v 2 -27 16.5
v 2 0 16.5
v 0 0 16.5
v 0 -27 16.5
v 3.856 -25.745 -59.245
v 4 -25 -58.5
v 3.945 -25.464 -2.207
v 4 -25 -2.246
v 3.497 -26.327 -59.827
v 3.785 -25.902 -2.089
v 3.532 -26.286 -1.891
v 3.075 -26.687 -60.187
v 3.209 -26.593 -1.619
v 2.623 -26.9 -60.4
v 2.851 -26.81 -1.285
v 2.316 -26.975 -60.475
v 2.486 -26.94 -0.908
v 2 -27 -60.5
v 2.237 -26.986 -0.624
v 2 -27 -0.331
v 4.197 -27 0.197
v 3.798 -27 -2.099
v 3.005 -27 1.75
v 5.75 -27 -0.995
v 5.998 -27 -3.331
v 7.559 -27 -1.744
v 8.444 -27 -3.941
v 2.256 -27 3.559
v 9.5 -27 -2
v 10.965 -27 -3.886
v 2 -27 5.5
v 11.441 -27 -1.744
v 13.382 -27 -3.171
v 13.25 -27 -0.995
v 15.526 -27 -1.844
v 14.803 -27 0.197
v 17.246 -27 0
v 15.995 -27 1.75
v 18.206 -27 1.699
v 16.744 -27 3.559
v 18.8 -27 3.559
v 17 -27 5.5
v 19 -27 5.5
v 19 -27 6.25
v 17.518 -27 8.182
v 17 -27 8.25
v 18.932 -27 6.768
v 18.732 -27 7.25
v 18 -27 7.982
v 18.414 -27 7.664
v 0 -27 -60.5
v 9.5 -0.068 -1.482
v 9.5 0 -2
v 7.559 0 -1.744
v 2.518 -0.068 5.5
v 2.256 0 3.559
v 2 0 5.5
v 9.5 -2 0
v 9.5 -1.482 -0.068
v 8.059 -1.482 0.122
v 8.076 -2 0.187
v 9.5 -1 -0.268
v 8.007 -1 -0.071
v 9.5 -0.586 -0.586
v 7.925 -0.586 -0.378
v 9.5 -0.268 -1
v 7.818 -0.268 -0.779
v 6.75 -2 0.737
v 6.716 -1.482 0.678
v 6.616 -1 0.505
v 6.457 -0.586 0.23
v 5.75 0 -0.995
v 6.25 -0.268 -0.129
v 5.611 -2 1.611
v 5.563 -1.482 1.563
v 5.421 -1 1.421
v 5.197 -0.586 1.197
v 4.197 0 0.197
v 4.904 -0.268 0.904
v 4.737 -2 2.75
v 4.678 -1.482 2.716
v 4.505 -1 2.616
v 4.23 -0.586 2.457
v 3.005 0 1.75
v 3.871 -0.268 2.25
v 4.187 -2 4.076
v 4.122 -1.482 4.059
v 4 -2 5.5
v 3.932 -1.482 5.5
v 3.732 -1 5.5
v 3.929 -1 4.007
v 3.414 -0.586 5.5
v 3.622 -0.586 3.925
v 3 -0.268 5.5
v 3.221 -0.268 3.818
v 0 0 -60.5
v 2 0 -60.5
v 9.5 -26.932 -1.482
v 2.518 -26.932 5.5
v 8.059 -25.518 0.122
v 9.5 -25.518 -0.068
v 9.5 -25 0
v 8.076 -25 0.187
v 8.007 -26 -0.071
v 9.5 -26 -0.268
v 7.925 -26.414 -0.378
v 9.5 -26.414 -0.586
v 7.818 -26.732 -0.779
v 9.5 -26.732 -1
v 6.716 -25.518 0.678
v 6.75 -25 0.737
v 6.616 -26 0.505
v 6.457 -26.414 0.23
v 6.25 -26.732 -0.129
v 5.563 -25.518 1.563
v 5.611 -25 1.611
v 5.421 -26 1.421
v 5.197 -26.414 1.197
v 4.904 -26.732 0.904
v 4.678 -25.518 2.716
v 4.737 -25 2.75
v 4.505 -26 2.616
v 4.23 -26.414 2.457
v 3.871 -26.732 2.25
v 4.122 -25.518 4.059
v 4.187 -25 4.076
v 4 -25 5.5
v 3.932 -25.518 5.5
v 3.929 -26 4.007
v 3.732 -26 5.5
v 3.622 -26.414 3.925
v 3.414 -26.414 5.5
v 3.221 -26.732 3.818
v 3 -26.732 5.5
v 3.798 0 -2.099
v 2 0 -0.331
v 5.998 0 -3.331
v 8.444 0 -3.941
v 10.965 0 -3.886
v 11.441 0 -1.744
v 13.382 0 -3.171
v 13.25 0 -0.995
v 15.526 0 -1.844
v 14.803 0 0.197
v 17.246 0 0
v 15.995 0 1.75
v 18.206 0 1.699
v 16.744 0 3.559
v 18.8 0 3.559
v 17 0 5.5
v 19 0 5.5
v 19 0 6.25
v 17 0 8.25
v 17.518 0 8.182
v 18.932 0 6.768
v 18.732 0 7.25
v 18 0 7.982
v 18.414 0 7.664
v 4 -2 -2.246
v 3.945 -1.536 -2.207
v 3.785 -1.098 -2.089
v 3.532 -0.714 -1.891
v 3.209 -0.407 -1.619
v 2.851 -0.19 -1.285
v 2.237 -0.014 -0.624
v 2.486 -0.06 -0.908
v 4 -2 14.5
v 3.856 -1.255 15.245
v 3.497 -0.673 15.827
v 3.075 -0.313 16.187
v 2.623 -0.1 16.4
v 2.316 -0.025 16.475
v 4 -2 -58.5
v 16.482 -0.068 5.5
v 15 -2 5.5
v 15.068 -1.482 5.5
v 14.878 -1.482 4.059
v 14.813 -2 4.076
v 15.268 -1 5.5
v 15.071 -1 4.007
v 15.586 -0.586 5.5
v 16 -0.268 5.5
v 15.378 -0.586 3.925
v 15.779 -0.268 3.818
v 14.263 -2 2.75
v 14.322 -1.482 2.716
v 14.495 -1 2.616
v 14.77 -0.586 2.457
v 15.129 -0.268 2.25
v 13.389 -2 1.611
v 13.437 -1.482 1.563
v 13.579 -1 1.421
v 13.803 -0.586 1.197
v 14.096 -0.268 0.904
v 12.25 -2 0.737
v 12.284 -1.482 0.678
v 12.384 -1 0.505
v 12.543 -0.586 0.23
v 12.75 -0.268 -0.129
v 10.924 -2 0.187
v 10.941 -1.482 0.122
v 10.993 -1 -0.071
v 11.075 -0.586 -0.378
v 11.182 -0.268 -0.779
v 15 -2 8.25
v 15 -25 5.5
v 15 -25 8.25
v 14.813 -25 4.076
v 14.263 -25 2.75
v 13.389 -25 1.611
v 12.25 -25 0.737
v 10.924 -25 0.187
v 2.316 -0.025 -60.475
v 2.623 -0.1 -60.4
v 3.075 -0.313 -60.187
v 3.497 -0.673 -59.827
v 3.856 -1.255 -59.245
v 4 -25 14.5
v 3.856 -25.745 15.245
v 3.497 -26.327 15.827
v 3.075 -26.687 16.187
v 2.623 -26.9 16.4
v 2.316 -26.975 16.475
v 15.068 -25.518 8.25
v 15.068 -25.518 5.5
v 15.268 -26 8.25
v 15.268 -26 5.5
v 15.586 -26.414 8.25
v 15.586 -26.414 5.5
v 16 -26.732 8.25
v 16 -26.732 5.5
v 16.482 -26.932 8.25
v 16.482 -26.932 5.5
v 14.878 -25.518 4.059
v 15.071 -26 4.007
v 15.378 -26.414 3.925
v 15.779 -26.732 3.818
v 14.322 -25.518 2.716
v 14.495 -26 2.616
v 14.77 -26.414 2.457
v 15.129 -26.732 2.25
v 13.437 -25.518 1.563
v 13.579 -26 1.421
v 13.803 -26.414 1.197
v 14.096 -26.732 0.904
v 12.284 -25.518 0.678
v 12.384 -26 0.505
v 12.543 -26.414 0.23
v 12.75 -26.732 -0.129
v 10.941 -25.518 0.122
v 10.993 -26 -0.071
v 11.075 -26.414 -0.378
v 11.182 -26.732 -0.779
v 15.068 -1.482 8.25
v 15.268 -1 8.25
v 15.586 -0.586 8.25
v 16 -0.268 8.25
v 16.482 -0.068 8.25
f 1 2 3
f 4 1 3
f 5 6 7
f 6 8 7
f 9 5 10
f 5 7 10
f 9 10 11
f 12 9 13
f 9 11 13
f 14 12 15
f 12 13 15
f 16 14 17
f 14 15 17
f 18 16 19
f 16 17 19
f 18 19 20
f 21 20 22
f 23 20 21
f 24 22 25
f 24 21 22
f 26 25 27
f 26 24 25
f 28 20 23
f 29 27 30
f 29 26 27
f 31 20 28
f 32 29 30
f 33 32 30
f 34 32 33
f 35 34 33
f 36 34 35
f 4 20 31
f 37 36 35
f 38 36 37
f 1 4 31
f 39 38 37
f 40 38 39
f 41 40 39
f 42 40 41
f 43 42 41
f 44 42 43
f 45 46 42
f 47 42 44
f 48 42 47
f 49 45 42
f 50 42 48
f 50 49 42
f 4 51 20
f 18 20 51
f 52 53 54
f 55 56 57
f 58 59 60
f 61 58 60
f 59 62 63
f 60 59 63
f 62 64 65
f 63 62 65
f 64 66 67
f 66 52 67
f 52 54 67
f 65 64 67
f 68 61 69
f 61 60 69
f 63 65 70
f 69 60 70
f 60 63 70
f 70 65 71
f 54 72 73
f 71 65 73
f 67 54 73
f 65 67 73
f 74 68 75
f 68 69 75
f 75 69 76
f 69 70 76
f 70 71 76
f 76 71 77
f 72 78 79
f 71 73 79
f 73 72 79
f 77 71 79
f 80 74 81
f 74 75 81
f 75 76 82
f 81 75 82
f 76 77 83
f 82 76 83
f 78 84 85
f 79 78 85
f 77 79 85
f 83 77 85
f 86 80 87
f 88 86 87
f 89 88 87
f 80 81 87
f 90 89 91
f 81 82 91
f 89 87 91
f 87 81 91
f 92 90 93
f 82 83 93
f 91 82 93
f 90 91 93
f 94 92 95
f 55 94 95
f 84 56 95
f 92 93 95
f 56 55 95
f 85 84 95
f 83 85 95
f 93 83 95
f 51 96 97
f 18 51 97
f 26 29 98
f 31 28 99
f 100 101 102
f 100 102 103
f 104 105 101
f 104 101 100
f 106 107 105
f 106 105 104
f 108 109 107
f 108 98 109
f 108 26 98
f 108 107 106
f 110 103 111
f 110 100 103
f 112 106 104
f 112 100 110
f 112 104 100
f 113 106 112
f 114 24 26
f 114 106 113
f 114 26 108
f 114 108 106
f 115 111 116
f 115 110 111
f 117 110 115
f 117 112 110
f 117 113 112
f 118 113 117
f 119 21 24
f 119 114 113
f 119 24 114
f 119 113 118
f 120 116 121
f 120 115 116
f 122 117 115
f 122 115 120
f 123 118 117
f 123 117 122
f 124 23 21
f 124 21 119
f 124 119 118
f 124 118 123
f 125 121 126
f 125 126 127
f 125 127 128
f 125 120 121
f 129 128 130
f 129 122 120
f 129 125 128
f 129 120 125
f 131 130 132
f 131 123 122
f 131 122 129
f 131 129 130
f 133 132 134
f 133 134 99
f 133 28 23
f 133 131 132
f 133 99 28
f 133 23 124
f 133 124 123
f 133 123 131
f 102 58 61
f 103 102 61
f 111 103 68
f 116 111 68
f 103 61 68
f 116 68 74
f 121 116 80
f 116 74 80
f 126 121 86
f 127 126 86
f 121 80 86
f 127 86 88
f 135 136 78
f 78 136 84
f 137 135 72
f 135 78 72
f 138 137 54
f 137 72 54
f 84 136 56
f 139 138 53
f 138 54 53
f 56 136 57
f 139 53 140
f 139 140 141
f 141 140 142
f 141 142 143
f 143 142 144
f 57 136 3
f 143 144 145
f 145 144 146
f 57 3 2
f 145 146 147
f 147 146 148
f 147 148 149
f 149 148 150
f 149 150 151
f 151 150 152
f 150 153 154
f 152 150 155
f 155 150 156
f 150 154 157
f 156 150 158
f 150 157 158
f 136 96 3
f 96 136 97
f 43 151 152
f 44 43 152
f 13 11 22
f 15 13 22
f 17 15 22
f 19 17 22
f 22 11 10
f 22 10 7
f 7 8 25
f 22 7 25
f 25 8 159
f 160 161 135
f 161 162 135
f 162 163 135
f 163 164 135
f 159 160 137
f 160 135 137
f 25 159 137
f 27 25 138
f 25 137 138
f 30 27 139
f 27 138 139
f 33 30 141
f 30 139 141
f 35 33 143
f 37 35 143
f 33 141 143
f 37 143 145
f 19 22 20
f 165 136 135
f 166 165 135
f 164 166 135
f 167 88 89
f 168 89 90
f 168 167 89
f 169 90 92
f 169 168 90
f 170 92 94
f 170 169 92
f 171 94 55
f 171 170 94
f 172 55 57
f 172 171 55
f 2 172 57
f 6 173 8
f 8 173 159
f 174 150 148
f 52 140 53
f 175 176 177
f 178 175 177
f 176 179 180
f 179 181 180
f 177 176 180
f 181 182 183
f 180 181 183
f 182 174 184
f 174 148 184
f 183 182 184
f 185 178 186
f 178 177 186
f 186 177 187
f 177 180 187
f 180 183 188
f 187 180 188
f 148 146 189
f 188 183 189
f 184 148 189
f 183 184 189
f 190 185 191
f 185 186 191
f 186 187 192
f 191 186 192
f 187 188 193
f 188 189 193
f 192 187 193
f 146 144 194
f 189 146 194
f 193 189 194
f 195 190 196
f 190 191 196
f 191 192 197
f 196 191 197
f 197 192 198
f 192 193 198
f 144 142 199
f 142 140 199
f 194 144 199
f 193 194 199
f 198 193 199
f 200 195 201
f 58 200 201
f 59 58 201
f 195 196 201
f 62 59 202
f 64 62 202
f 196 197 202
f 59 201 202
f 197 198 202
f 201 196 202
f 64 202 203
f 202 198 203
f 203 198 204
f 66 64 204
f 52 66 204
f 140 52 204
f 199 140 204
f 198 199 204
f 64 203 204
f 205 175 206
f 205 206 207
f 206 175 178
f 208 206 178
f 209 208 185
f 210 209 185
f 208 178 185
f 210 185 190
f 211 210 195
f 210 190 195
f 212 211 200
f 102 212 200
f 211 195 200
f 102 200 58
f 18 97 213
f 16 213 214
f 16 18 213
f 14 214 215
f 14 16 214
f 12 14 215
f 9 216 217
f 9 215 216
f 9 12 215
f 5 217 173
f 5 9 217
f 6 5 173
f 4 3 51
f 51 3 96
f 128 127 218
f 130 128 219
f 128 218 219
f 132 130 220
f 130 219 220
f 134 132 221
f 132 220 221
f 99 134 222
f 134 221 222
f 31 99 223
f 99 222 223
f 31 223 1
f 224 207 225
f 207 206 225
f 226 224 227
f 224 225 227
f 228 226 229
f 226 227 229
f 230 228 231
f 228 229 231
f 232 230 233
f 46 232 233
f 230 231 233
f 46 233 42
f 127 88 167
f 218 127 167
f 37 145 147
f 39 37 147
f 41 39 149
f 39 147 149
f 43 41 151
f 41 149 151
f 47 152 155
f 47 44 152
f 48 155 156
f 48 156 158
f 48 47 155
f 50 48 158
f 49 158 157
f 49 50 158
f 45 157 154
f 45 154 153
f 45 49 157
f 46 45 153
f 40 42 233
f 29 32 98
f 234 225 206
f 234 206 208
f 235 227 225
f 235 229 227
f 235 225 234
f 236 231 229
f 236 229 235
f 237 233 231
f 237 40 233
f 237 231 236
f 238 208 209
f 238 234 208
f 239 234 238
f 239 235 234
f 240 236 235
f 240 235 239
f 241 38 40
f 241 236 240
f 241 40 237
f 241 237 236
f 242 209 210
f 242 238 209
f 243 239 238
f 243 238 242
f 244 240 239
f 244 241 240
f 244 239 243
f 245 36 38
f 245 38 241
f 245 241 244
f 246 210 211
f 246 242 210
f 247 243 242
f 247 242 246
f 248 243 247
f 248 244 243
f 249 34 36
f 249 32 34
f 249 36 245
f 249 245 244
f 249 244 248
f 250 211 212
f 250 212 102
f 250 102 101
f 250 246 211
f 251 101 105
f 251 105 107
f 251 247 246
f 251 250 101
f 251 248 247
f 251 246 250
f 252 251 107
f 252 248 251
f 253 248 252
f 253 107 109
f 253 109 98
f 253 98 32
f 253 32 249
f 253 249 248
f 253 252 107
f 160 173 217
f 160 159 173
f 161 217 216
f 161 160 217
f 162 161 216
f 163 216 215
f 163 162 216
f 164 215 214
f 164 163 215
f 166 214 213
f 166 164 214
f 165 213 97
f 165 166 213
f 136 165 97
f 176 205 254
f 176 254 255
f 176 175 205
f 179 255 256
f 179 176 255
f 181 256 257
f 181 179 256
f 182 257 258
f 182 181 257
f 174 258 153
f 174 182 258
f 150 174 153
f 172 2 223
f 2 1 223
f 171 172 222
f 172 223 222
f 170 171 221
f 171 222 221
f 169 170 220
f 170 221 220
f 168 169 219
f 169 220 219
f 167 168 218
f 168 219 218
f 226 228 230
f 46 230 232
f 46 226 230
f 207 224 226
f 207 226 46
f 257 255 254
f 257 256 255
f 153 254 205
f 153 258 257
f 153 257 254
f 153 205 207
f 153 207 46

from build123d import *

# Parameters (mm, degrees)
F1_W     = 4
F1_H     = 2.75
F2_DEPTH = 27
F3_R     = 1.99999


# Not quite as in the source:
# - a fillet or chamfer is up to 0.001 mm smaller than in the source, because OpenCascade refuses the exact size


with BuildPart() as f2:
    # F1 (on Front) → F2 (new body)
    with BuildSketch(Plane.XZ):
        with BuildLine():
            Line((4, 16.5), (0, 16.5))
            Line((0, 16.5), (0, 5.5))
            ThreePointArc((0, 5.5), (1.0590284919, 9.8588989435), (4, 13.2459666924))
            Line((4, 13.2459666924), (4, 16.5))
        make_face()
        with BuildLine():
            ThreePointArc((1.7540333076, 0), (0.4491248054, 2.6135388083), (0, 5.5))
            Line((0, 5.5), (0, 0))
            Line((0, 0), (1.7540333076, 0))
        make_face()
        with BuildLine():
            Line((4, 5.5), (0, 5.5))
            ThreePointArc((0, 5.5), (0.4491248054, 2.6135388083), (1.7540333076, 0))
            Line((1.7540333076, 0), (4, 0))
            Line((4, 0), (4, 5.5))
        make_face()
        with BuildLine():
            ThreePointArc((4, 13.2459666924), (1.0590284919, 9.8588989435), (0, 5.5))
            Line((0, 5.5), (4, 5.5))
            Line((4, 5.5), (4, 13.2459666924))
        make_face()
        with BuildLine():
            Line((1.7540333076, 0), (0, 0))
            Line((0, 0), (0, -60.5))
            Line((0, -60.5), (4, -60.5))
            Line((4, -60.5), (4, -2.2459666924))
            ThreePointArc((4, -2.2459666924), (2.7824855787, -1.2175144213), (1.7540333076, 0))
        make_face()
        with BuildLine():
            Line((4, 0), (1.7540333076, 0))
            ThreePointArc((1.7540333076, 0), (2.7824855787, -1.2175144213), (4, -2.2459666924))
            Line((4, -2.2459666924), (4, 0))
        make_face()
        with BuildLine():
            ThreePointArc((9.5, 0), (5.6109127035, 1.6109127035), (4, 5.5))
            Line((4, 5.5), (4, 0))
            Line((4, 0), (9.5, 0))
        make_face()
        with BuildLine():
            Line((9.5, 0), (4, 0))
            Line((4, 0), (4, -2.2459666924))
            ThreePointArc((4, -2.2459666924), (11.0881382785, -3.8663128716), (17.2459666924, 0))
            Line((17.2459666924, 0), (9.5, 0))
        make_face()
        with BuildLine():
            ThreePointArc((15, 5.5), (13.3890872965, 1.6109127035), (9.5, 0))
            Line((9.5, 0), (17.2459666924, 0))
            ThreePointArc((17.2459666924, 0), (18.5508751946, 2.6135388083), (19, 5.5))
            Line((19, 5.5), (15, 5.5))
        make_face()
        with Locations((17, 6.875)):
            Rectangle(F1_W, F1_H)
    extrude(amount=F2_DEPTH)

    # F3 (radius 2 in the source; OpenCascade refuses exactly that, so slightly less here)
    f3_edges = [f2.edges().sort_by_distance(p)[0] for p in [
        (4, -27, -31.372983),
        (4, -27, 11),
        (4, 0, -31.372983),
        (4, -13.5, -60.5),
        (4, 0, 11),
        (19, -13.5, 8.25),
        (4, -13.5, 16.5),
    ]]
    fillet(f3_edges, radius=F3_R)


solid = f2.part
